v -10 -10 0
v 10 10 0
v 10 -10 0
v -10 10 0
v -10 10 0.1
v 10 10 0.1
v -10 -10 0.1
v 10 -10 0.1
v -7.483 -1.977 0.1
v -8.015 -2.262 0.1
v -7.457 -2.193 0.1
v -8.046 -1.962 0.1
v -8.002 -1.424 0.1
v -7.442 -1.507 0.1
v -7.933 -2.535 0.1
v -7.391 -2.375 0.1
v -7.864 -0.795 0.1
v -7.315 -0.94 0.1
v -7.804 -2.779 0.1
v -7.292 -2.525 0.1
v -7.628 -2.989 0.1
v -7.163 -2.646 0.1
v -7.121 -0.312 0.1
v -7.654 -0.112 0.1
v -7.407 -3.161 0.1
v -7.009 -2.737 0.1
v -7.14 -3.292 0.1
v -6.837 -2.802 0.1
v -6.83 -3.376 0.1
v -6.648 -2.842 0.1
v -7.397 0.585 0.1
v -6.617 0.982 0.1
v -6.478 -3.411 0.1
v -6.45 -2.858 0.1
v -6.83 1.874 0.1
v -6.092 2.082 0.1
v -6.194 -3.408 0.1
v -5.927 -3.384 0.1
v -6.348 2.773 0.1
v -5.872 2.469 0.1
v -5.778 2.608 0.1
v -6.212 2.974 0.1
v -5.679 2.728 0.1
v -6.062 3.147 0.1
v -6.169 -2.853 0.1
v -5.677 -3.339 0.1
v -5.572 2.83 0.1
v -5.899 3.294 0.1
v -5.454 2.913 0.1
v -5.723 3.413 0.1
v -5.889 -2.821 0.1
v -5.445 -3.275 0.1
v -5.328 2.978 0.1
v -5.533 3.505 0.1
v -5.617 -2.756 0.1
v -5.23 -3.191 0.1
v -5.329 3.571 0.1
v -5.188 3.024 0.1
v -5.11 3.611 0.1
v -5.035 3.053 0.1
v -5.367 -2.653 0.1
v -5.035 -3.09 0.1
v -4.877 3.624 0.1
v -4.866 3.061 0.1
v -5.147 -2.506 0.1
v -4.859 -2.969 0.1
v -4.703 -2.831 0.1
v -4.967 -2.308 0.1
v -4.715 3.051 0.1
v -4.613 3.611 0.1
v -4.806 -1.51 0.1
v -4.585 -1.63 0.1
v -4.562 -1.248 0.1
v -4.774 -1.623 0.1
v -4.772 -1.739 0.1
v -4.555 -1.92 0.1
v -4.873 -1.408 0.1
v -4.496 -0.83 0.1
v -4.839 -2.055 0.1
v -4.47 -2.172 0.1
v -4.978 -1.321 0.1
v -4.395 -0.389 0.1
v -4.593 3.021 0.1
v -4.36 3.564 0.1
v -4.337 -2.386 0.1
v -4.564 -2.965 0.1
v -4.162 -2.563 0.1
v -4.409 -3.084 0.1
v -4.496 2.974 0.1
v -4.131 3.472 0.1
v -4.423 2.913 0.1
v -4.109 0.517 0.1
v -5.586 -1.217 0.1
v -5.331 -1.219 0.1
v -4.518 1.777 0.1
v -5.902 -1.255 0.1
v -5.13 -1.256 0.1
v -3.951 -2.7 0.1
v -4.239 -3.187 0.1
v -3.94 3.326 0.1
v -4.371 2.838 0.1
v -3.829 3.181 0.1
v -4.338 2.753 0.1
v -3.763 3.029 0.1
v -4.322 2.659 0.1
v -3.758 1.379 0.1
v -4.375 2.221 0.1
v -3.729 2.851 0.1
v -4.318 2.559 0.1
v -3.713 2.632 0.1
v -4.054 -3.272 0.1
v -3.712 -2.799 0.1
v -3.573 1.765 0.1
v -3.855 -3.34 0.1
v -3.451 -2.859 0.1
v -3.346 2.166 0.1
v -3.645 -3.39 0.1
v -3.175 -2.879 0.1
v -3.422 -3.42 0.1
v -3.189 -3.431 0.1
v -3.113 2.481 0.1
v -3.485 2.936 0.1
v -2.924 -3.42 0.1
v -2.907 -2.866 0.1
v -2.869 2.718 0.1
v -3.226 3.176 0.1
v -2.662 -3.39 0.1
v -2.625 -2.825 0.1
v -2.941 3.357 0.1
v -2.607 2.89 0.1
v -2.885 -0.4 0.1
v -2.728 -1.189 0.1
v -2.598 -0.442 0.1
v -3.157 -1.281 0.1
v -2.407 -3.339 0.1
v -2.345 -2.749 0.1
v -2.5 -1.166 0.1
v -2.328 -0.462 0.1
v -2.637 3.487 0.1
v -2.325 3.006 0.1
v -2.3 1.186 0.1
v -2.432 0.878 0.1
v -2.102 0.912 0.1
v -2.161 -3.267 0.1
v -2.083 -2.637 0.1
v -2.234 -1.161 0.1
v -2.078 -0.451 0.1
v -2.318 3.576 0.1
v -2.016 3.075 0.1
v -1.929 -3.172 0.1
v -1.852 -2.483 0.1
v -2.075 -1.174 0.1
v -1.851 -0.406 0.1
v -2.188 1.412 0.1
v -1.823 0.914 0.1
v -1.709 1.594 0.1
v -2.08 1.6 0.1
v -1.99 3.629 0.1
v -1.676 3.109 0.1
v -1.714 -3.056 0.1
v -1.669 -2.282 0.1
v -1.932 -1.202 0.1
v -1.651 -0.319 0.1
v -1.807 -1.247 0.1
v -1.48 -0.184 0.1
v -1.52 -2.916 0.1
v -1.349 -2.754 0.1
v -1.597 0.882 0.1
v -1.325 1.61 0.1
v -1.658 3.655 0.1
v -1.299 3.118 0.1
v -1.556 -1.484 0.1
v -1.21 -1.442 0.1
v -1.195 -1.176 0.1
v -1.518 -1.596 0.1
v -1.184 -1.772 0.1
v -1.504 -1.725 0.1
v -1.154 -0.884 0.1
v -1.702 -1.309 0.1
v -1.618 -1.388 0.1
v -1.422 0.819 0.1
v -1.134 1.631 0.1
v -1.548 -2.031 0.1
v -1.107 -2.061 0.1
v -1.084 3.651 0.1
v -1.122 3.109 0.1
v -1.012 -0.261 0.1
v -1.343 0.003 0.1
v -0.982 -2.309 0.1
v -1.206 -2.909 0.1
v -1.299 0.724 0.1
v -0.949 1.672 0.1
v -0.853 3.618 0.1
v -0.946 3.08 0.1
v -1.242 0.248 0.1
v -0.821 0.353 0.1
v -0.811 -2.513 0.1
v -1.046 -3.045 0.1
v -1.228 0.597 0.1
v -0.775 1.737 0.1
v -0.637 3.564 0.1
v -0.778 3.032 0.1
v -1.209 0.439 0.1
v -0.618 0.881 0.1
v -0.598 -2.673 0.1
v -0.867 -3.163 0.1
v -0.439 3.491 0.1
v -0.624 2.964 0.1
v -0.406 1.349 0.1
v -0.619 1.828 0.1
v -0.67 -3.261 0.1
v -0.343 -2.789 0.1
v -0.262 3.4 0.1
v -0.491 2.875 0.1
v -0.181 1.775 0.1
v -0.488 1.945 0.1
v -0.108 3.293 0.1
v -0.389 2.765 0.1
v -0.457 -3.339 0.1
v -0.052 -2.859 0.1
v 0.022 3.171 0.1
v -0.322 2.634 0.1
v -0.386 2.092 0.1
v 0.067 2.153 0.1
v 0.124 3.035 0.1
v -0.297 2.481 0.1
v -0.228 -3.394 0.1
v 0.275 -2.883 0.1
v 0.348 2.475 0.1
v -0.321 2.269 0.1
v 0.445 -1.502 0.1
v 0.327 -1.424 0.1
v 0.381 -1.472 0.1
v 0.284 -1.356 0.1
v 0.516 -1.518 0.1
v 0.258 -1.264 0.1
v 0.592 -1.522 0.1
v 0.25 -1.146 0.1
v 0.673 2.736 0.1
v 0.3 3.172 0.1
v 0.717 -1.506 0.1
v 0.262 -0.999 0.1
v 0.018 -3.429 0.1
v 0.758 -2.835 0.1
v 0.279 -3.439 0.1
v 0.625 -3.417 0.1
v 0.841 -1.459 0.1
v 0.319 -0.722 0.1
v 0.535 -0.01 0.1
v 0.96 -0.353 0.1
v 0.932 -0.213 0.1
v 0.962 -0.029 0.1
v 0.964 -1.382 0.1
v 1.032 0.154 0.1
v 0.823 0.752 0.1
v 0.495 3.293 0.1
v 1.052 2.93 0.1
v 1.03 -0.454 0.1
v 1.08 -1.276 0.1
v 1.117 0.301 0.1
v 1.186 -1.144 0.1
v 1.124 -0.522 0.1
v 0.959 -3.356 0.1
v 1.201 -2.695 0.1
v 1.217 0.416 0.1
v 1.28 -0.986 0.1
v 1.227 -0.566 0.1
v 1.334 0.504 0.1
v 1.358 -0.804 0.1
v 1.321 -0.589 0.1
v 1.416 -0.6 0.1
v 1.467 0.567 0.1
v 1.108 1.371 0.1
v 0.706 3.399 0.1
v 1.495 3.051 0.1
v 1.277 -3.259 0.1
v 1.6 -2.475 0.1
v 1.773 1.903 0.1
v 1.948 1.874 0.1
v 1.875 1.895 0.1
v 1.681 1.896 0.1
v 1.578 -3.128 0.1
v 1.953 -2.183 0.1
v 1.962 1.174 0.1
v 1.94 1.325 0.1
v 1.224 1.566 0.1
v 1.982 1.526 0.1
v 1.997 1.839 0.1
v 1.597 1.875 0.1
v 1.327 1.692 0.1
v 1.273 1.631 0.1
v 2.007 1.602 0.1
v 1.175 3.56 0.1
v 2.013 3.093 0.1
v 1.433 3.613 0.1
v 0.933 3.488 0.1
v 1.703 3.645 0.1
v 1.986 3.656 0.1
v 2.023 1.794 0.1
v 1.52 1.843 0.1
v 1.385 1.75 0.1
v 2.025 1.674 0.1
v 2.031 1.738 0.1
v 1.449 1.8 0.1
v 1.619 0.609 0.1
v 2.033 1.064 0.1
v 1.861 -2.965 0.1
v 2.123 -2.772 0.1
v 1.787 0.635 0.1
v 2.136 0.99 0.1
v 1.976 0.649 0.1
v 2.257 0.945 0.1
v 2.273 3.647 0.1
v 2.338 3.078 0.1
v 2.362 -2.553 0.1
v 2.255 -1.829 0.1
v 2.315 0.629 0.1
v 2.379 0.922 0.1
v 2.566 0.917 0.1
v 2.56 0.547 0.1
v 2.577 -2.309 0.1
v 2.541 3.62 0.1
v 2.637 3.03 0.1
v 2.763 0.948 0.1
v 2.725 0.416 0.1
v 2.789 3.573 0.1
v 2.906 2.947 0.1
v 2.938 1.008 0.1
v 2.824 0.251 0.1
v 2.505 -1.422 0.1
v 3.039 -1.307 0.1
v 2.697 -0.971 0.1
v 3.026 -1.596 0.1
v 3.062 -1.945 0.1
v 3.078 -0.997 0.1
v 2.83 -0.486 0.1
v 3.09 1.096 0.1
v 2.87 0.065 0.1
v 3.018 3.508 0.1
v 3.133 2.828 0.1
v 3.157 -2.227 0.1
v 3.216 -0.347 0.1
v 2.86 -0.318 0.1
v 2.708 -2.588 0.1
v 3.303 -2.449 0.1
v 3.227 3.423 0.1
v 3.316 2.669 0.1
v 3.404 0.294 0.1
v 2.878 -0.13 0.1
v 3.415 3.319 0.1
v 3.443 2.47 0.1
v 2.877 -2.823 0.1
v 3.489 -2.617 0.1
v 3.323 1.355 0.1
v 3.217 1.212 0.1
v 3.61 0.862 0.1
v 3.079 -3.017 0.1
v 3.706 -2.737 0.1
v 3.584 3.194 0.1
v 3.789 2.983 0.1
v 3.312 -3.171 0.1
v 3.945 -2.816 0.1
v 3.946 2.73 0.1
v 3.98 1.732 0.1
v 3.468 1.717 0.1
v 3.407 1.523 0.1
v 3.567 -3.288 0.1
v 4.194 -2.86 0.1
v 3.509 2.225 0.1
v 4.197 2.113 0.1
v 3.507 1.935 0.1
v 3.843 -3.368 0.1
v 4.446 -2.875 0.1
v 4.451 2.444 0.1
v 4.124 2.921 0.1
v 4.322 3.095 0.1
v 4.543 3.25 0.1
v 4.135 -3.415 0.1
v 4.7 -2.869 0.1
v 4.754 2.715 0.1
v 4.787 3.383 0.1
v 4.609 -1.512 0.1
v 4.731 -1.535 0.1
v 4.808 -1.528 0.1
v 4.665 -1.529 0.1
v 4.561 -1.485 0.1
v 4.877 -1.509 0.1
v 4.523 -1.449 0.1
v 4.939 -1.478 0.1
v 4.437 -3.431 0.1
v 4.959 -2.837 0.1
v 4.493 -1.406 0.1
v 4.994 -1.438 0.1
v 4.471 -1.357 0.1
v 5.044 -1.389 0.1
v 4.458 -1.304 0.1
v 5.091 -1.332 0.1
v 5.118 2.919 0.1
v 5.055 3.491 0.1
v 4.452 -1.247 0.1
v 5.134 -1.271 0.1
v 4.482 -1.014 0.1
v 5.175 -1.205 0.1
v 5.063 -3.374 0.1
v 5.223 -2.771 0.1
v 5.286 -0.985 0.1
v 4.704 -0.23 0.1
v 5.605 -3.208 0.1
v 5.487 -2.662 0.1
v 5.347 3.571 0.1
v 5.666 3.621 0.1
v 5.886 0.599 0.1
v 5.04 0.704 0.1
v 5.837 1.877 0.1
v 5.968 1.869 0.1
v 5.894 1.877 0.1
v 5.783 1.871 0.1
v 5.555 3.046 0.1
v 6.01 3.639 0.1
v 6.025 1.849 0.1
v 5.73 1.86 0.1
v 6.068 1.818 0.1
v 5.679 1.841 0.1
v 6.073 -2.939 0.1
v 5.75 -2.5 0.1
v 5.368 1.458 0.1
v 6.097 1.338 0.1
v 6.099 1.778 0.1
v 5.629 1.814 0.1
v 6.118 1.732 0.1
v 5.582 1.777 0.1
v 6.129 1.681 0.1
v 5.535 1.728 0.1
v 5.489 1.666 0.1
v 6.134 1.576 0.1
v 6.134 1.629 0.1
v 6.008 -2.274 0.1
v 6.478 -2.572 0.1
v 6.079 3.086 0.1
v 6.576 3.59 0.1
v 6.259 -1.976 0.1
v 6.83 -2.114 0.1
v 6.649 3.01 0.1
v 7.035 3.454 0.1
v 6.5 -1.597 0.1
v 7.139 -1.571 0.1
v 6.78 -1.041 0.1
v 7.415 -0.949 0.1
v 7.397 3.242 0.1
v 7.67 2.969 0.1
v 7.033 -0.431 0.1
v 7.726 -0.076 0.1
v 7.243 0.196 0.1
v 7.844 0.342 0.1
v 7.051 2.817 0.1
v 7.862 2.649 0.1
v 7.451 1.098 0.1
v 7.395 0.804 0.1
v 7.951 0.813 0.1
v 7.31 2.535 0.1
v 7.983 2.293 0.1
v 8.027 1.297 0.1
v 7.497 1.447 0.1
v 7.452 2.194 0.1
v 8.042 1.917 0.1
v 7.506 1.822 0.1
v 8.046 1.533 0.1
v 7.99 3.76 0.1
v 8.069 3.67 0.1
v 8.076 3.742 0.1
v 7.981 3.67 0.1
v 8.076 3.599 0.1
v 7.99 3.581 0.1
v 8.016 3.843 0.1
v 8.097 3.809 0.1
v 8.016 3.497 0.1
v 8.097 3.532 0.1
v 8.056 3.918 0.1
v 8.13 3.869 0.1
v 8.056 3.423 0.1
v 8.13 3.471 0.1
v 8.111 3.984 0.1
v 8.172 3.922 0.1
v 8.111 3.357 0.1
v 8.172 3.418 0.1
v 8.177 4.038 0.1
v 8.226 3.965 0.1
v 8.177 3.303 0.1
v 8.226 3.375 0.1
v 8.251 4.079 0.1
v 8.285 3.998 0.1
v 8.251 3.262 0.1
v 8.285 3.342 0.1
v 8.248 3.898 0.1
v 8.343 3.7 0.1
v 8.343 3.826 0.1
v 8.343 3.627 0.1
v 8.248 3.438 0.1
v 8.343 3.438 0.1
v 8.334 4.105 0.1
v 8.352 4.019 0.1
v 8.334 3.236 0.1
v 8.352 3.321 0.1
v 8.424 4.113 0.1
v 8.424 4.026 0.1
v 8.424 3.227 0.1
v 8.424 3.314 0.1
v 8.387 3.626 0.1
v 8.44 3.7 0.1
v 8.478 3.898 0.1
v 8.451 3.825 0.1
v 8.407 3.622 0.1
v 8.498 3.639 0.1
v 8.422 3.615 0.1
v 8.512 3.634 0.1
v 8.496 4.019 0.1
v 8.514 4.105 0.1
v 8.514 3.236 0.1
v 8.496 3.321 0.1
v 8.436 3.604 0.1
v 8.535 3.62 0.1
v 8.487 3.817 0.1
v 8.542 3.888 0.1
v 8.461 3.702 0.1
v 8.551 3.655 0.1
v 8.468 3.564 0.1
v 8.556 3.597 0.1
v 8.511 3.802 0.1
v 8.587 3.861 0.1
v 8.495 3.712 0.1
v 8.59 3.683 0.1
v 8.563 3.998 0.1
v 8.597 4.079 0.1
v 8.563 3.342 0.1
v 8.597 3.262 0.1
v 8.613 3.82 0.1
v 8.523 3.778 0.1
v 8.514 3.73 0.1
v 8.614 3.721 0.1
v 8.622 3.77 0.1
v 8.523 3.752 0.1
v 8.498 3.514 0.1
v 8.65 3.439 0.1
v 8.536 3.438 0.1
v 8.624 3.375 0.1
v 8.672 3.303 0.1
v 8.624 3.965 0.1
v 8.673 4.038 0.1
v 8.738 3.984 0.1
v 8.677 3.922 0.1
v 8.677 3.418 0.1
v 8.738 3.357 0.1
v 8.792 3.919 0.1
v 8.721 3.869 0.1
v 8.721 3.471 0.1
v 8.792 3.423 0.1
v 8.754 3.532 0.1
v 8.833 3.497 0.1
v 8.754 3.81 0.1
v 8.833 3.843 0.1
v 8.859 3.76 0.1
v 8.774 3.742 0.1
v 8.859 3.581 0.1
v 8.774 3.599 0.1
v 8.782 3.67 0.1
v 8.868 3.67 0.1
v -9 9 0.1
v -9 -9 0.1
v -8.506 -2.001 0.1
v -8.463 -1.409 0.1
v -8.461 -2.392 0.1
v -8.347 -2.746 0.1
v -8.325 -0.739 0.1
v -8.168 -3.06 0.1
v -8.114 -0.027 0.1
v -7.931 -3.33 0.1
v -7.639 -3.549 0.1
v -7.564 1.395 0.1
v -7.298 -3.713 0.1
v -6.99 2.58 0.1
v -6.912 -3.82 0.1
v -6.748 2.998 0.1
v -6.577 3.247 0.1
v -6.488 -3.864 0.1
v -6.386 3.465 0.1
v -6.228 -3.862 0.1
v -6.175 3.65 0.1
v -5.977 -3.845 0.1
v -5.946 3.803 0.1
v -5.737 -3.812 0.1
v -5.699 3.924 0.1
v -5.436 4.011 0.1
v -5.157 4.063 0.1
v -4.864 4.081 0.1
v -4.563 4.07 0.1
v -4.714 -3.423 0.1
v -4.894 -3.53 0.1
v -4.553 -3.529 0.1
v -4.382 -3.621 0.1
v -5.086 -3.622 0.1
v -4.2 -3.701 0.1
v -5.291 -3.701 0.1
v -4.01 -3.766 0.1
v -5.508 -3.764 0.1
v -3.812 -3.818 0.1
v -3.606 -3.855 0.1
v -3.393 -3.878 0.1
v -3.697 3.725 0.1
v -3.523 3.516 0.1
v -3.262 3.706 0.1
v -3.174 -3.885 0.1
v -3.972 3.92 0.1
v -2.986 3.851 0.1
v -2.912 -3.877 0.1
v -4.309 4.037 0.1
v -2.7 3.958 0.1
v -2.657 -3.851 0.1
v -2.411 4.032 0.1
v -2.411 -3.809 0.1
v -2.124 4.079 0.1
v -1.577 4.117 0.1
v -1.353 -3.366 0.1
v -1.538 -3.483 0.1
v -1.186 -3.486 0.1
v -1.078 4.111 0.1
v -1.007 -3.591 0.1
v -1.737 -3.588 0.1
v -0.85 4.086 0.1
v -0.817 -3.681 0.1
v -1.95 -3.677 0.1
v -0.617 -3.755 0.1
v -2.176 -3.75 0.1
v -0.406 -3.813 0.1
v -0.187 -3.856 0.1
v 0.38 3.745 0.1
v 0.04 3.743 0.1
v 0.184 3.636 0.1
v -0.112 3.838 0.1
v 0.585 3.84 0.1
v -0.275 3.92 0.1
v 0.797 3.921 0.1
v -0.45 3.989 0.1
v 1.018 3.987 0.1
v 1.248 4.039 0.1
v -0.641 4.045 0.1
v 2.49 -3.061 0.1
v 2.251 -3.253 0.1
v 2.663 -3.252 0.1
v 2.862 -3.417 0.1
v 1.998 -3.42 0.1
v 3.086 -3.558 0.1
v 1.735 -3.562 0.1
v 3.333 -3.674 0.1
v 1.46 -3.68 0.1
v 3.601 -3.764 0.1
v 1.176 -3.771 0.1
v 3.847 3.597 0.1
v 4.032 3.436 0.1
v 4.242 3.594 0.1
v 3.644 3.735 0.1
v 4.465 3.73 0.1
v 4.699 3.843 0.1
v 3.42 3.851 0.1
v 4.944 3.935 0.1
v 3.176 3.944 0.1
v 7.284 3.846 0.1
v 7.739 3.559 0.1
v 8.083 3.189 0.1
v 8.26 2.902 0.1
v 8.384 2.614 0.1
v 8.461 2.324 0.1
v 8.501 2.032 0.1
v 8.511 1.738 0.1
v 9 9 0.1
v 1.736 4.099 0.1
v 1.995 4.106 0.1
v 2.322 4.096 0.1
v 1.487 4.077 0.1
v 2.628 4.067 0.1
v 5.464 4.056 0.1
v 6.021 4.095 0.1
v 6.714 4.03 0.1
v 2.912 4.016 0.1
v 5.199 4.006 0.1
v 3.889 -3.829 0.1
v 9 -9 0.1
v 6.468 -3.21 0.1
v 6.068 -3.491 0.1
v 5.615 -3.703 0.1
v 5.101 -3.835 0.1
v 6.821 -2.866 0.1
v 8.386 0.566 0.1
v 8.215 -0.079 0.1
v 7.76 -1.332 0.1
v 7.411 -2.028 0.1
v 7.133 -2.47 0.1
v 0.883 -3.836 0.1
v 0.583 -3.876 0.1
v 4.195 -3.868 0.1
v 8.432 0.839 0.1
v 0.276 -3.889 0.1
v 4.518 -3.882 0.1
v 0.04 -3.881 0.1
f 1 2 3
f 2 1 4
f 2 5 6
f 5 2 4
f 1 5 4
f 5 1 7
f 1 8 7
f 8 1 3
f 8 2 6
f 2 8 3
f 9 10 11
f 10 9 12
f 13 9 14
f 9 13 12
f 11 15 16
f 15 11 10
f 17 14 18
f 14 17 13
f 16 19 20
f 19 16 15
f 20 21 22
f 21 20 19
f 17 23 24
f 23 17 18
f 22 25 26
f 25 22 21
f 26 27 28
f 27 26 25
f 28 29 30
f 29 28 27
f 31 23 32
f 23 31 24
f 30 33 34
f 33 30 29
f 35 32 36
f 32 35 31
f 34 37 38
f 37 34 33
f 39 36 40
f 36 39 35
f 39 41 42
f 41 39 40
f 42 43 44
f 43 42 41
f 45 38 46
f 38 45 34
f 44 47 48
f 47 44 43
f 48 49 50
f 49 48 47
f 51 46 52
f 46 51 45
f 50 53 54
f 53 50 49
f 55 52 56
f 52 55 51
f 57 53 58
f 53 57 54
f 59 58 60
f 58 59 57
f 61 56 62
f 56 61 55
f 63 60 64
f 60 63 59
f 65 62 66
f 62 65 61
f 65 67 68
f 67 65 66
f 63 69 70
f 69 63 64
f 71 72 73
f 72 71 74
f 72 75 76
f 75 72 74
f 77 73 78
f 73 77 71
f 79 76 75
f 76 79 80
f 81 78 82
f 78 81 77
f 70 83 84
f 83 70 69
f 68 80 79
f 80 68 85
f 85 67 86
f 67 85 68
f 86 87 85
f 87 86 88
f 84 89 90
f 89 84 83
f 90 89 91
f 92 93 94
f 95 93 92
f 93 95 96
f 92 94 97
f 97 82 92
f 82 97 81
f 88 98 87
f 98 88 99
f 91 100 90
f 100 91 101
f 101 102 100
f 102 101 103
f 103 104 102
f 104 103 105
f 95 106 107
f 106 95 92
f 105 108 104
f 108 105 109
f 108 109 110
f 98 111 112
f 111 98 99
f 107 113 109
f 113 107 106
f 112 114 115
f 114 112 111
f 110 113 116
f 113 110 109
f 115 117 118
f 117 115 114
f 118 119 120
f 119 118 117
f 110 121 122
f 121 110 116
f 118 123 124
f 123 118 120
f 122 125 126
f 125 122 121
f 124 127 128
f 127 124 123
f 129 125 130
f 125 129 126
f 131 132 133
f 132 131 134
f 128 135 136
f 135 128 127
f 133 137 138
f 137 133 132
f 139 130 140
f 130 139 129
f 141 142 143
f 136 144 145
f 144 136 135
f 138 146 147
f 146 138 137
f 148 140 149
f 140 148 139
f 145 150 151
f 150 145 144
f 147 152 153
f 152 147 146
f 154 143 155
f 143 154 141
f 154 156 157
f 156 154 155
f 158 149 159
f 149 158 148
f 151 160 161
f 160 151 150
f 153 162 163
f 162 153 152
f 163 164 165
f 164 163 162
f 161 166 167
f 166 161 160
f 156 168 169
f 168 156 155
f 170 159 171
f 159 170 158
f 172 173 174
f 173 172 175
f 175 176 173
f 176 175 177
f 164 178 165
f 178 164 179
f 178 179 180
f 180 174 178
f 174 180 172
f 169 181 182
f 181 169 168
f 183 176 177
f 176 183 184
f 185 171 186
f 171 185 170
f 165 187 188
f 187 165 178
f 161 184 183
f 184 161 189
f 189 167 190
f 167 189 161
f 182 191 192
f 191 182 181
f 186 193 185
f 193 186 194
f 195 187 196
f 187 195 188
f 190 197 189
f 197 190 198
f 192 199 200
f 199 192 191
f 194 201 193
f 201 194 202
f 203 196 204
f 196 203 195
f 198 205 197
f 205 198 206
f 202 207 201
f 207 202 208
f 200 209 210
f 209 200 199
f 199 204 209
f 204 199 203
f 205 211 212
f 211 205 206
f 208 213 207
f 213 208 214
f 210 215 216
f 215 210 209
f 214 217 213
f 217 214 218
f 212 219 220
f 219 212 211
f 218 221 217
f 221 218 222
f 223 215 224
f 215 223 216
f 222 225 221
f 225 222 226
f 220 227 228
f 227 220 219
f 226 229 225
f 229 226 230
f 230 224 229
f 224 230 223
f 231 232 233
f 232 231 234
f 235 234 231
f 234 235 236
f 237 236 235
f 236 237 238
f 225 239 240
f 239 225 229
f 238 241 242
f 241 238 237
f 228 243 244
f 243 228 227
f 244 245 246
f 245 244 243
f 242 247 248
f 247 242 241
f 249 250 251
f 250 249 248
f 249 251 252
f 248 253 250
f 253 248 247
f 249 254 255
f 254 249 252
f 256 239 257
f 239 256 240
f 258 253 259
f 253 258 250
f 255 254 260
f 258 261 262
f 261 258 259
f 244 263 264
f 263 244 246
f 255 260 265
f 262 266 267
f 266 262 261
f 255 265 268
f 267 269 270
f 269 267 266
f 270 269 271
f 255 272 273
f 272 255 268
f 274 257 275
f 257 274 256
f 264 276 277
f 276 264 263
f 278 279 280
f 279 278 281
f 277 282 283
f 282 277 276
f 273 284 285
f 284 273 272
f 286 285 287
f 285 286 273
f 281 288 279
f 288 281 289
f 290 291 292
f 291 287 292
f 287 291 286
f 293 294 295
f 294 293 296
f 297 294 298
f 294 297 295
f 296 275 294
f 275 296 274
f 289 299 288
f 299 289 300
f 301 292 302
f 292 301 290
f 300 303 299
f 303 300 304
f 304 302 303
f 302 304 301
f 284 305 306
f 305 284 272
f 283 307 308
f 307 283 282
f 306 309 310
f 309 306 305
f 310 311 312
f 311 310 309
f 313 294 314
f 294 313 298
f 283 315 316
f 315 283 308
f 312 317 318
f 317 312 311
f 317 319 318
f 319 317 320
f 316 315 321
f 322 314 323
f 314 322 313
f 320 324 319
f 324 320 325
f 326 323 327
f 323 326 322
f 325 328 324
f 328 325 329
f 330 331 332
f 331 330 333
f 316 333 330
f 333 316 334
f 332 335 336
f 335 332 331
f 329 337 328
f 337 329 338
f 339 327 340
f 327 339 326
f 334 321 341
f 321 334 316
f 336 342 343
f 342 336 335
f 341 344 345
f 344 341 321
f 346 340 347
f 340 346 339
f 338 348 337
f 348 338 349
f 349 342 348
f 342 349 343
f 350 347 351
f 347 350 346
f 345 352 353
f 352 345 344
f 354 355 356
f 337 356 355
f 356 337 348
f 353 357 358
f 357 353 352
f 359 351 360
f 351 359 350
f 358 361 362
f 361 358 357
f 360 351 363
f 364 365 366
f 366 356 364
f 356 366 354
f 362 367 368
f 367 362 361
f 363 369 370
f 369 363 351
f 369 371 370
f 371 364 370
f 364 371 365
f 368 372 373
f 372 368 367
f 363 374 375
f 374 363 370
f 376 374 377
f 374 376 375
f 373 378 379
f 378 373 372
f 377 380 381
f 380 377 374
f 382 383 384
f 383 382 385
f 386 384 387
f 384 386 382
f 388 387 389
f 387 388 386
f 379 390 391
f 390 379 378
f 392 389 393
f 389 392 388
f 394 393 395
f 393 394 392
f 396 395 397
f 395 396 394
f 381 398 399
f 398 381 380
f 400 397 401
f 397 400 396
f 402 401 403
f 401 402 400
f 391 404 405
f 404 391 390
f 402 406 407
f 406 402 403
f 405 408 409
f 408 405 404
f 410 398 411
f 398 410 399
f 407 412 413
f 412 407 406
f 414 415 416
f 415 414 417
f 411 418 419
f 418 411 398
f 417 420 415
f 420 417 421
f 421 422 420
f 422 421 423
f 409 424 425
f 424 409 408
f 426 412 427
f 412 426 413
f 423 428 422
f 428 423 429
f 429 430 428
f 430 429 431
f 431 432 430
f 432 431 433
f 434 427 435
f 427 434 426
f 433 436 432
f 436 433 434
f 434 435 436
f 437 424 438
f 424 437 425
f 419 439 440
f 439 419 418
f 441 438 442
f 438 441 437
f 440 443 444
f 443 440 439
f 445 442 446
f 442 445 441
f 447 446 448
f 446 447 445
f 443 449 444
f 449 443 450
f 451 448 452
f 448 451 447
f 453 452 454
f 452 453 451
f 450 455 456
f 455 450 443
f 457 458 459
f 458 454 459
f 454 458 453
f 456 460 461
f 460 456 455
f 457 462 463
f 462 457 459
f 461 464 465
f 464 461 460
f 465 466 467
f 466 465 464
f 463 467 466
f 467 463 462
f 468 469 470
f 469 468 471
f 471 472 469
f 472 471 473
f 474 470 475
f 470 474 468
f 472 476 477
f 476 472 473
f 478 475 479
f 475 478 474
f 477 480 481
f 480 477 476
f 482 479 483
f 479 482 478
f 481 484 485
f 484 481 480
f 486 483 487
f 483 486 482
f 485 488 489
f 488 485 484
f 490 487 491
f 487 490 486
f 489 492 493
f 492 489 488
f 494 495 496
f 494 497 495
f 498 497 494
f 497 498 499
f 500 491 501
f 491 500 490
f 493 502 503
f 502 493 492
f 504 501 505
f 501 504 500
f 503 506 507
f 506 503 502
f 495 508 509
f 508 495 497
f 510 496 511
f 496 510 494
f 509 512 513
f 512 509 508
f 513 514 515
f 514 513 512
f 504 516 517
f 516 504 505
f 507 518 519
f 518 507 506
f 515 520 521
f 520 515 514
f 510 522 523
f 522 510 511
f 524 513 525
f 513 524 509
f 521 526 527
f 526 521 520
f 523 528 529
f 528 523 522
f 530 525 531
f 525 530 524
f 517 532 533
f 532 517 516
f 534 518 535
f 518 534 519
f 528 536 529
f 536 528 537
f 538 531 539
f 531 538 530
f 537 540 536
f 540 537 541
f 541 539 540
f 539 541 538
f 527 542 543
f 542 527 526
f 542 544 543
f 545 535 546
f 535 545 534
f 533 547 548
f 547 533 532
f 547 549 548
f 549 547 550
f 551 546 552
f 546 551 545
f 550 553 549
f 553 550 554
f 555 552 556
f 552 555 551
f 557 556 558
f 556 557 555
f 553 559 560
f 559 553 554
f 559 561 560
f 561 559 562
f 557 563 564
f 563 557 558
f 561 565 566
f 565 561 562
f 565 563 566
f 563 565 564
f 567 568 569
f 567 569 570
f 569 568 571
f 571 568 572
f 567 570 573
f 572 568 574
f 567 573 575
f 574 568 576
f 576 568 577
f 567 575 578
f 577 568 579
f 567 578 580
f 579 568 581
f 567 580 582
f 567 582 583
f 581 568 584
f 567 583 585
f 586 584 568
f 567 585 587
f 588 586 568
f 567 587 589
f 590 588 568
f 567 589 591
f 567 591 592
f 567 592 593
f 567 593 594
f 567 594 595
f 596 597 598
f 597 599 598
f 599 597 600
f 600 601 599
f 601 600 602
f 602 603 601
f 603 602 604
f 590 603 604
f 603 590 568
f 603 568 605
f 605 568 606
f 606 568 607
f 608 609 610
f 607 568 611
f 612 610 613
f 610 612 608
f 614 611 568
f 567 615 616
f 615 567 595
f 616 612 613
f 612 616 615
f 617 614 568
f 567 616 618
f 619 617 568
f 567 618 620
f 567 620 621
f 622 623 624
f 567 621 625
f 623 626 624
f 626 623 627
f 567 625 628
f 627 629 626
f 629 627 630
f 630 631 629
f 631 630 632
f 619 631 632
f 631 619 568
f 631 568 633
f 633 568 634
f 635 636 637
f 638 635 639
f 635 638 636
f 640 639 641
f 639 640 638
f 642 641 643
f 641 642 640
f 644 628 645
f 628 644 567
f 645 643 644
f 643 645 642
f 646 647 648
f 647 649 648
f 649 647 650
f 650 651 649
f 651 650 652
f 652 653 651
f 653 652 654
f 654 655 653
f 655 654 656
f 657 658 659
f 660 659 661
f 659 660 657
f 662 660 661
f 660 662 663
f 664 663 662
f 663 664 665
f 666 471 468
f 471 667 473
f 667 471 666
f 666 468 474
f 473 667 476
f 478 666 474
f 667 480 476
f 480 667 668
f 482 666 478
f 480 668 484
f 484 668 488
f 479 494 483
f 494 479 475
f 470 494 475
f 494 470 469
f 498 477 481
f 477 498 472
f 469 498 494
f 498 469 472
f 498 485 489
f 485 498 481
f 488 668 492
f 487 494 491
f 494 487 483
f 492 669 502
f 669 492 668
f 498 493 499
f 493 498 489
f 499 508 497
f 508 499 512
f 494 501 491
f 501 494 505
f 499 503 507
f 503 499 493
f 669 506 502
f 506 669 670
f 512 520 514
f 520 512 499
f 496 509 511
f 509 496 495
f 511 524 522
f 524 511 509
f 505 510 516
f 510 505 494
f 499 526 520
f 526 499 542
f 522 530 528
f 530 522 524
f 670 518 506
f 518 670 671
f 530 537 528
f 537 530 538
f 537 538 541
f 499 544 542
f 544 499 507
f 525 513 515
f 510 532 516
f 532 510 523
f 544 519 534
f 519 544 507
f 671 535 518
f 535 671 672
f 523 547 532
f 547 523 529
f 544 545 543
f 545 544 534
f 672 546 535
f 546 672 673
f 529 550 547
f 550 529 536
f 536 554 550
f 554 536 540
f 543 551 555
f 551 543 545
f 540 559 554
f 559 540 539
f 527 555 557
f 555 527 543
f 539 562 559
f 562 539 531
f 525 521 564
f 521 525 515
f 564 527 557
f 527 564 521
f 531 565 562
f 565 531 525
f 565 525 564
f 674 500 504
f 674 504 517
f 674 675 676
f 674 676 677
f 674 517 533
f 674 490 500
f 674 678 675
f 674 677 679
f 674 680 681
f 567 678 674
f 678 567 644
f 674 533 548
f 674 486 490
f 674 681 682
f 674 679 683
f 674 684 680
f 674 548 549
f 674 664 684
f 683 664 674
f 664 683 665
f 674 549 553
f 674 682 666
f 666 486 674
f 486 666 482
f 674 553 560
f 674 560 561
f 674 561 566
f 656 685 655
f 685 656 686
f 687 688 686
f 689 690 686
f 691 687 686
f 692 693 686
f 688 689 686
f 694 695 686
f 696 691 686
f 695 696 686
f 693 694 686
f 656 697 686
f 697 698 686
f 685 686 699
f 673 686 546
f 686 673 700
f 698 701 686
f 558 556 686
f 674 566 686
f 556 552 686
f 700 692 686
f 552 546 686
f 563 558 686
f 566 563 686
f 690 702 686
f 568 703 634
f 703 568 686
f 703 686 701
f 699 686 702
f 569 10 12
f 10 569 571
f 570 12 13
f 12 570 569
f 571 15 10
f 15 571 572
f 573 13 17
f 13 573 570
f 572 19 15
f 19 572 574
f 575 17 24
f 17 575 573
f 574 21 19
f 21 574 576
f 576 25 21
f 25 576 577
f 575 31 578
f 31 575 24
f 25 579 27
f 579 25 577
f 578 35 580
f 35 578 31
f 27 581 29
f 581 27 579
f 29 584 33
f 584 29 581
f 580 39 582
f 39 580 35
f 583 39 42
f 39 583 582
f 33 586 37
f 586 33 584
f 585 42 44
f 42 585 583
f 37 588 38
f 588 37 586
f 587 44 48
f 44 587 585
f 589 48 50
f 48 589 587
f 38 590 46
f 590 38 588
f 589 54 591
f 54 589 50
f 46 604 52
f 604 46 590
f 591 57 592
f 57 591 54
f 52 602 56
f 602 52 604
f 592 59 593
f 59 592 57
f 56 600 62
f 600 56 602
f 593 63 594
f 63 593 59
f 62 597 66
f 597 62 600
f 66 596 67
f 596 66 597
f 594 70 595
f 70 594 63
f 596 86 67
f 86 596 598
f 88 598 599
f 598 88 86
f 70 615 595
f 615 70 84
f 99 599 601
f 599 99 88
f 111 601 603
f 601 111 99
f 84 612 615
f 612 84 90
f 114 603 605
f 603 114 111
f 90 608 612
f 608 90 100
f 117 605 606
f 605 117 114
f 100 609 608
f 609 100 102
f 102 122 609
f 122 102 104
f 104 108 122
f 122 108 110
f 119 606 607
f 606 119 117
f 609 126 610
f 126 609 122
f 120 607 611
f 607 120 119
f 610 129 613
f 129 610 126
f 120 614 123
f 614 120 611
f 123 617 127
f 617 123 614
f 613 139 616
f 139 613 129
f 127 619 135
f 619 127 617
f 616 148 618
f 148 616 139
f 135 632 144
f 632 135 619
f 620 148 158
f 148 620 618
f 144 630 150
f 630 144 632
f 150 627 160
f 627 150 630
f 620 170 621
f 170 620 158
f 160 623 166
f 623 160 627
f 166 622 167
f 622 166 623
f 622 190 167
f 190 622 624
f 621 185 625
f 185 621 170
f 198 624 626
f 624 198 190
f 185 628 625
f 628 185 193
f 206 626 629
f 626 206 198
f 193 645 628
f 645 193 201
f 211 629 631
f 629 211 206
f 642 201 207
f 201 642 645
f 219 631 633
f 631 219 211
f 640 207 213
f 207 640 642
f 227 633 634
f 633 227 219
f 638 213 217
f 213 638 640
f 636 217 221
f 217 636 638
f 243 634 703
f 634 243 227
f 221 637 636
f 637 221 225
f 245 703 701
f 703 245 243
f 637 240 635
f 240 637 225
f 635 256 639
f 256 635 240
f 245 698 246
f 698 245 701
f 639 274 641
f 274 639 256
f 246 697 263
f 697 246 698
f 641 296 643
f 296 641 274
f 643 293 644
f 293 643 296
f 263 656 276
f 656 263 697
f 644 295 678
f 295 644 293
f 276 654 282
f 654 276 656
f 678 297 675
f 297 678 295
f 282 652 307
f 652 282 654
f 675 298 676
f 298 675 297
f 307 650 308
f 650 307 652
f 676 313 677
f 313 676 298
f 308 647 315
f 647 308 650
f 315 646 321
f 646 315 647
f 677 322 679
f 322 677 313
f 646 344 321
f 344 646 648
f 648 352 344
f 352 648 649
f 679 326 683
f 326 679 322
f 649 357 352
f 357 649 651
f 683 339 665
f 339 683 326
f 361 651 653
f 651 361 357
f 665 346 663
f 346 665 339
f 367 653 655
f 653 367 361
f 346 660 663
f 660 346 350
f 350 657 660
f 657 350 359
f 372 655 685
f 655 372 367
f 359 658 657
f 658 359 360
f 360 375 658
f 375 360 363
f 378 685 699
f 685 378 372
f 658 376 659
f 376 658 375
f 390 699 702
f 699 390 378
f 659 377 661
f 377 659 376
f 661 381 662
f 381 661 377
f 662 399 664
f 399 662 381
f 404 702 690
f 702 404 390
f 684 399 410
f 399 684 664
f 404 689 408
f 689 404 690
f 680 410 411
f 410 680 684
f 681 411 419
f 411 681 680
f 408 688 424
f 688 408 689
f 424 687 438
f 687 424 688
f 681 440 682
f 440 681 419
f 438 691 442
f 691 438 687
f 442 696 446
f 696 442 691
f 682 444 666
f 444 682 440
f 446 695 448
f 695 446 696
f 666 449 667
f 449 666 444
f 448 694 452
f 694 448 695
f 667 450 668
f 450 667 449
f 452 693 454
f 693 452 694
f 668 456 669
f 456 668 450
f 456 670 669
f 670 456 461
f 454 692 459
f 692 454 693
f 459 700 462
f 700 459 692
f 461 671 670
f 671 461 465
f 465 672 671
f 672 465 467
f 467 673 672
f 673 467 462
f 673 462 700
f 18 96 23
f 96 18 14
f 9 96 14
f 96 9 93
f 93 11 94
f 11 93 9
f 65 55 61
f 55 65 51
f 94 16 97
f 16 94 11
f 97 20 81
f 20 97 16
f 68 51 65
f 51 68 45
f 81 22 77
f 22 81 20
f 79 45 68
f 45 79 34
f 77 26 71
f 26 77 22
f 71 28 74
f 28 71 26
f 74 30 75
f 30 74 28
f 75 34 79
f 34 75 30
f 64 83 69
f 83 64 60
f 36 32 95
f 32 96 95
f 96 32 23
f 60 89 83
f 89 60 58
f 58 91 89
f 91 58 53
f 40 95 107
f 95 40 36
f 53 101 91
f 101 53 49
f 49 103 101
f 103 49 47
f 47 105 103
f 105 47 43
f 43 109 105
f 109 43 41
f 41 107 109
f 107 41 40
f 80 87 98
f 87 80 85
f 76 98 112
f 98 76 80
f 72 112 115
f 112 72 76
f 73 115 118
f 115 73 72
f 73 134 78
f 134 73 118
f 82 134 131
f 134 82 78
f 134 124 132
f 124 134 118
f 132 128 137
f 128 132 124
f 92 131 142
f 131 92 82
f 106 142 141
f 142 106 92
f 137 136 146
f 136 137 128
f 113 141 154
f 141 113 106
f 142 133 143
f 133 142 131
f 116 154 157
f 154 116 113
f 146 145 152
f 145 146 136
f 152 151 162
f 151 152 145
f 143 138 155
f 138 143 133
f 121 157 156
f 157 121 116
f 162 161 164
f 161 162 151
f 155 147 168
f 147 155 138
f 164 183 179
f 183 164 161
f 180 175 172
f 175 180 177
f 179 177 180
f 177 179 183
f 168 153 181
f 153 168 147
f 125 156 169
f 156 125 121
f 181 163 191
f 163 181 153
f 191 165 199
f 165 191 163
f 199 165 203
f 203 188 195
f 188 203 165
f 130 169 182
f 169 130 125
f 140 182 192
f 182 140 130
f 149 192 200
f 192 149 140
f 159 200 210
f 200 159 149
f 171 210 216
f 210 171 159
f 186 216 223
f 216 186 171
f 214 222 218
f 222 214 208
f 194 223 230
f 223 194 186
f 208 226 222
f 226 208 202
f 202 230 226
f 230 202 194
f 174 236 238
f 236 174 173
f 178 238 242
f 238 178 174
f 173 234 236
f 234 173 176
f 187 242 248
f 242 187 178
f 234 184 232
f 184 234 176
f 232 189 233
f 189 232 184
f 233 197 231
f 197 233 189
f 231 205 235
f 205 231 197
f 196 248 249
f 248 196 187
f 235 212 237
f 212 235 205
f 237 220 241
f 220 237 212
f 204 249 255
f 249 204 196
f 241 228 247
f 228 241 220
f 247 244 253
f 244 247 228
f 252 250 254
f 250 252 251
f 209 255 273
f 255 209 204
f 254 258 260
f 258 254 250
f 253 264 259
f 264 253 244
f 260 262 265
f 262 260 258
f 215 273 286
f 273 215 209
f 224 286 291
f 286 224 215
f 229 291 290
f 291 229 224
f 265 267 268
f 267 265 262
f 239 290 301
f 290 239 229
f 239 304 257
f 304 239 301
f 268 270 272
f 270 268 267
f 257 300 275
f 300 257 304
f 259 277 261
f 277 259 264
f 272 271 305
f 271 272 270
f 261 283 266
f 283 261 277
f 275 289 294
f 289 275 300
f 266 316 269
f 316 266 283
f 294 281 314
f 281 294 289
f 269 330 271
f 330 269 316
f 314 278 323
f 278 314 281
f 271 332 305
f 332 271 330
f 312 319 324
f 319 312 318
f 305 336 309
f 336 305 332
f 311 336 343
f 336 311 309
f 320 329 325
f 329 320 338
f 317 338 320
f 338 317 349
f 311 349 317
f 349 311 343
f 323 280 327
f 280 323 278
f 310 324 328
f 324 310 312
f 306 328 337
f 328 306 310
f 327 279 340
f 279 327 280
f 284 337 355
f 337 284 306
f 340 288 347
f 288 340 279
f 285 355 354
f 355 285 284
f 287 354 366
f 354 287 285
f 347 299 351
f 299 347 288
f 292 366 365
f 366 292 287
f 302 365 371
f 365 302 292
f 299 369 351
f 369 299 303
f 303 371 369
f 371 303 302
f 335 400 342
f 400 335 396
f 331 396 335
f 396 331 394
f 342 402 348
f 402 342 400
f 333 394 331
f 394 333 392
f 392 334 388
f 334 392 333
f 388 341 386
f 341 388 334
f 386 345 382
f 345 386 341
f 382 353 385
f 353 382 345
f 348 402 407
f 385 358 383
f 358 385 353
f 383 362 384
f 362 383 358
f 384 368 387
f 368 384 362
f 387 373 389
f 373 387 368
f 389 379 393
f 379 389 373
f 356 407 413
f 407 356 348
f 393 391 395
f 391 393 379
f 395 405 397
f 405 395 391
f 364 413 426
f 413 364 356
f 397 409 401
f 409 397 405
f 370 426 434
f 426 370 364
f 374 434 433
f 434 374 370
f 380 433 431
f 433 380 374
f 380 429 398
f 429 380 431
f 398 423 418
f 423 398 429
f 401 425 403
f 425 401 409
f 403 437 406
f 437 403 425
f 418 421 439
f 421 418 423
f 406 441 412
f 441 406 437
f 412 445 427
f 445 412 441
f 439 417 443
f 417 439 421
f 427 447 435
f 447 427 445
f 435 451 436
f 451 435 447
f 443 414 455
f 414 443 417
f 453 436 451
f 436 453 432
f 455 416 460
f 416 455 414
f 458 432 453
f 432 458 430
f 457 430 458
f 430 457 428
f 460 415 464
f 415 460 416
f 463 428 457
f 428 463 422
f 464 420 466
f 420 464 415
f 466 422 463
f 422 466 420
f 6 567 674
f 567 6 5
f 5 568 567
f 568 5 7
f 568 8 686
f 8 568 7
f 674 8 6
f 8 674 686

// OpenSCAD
use <../lib.scad>
use <../p/box5-12.scad>
use <../p/logo-lego-2.scad>
function ldraw_lib__4155159b() = [
// 0 Sticker  2.5 x  2.5 with LEGO Logo
// 0 Name: 4155159b.dat
// 0 Author: Marc Giraudet [Mad_Marc]
// 0 !LDRAW_ORG Part UPDATE 2024-02
// 0 !LICENSE Licensed under CC BY 4.0 : see CAreadme.txt
// 
// 0 BFC CERTIFY CCW
  [0,"BFC","CERTIFY"],
  [0,"BFC","CCW"],
// 
// 0 !KEYWORDS Set 3723
// 
// 0 !HISTORY 2024-03-24 [OrionP] Official Update 2024-02
// 
// 
// 1 16 0 -0.25 0 25 0 0 0 0.25 0 0 0 25 box5-12.dat
  [1,16,0,-0.25,0,25,0,0,0,0.25,0,0,0,25, ldraw_lib__box5_12()],
// 1 4 0 -0.25 0 1.125 0 0 0 0 1 0 -1.125 0 logo-lego-2.dat
  [1,4,0,-0.25,0,1.125,0,0,0,0,1,0,-1.125,0, ldraw_lib__logo_lego_2()],
// 4 0 25 -0.25 25 -25 -0.25 25 -22.5 -0.25 22.5 22.5 -0.25 22.5
  [4,0,25,-0.25,25,-25,-0.25,25,-22.5,-0.25,22.5,22.5,-0.25,22.5],
// 4 0 -25 -0.25 25 -25 -0.25 -25 -22.5 -0.25 -22.5 -22.5 -0.25 22.5
  [4,0,-25,-0.25,25,-25,-0.25,-25,-22.5,-0.25,-22.5,-22.5,-0.25,22.5],
// 4 0 -25 -0.25 -25 25 -0.25 -25 22.5 -0.25 -22.5 -22.5 -0.25 -22.5
  [4,0,-25,-0.25,-25,25,-0.25,-25,22.5,-0.25,-22.5,-22.5,-0.25,-22.5],
// 4 0 25 -0.25 -25 25 -0.25 25 22.5 -0.25 22.5 22.5 -0.25 -22.5
  [4,0,25,-0.25,-25,25,-0.25,25,22.5,-0.25,22.5,22.5,-0.25,-22.5],
];
module ldraw_lib__4155159b(step=0, col=false, unit=2/5, alt=false, line=0.2, solid=!$preview)
    makepoly(ldraw_lib__4155159b(), step=step, col=col, unit=unit, alt=alt, line=line, solid=solid);
ldraw_lib__4155159b(line=0.2);
